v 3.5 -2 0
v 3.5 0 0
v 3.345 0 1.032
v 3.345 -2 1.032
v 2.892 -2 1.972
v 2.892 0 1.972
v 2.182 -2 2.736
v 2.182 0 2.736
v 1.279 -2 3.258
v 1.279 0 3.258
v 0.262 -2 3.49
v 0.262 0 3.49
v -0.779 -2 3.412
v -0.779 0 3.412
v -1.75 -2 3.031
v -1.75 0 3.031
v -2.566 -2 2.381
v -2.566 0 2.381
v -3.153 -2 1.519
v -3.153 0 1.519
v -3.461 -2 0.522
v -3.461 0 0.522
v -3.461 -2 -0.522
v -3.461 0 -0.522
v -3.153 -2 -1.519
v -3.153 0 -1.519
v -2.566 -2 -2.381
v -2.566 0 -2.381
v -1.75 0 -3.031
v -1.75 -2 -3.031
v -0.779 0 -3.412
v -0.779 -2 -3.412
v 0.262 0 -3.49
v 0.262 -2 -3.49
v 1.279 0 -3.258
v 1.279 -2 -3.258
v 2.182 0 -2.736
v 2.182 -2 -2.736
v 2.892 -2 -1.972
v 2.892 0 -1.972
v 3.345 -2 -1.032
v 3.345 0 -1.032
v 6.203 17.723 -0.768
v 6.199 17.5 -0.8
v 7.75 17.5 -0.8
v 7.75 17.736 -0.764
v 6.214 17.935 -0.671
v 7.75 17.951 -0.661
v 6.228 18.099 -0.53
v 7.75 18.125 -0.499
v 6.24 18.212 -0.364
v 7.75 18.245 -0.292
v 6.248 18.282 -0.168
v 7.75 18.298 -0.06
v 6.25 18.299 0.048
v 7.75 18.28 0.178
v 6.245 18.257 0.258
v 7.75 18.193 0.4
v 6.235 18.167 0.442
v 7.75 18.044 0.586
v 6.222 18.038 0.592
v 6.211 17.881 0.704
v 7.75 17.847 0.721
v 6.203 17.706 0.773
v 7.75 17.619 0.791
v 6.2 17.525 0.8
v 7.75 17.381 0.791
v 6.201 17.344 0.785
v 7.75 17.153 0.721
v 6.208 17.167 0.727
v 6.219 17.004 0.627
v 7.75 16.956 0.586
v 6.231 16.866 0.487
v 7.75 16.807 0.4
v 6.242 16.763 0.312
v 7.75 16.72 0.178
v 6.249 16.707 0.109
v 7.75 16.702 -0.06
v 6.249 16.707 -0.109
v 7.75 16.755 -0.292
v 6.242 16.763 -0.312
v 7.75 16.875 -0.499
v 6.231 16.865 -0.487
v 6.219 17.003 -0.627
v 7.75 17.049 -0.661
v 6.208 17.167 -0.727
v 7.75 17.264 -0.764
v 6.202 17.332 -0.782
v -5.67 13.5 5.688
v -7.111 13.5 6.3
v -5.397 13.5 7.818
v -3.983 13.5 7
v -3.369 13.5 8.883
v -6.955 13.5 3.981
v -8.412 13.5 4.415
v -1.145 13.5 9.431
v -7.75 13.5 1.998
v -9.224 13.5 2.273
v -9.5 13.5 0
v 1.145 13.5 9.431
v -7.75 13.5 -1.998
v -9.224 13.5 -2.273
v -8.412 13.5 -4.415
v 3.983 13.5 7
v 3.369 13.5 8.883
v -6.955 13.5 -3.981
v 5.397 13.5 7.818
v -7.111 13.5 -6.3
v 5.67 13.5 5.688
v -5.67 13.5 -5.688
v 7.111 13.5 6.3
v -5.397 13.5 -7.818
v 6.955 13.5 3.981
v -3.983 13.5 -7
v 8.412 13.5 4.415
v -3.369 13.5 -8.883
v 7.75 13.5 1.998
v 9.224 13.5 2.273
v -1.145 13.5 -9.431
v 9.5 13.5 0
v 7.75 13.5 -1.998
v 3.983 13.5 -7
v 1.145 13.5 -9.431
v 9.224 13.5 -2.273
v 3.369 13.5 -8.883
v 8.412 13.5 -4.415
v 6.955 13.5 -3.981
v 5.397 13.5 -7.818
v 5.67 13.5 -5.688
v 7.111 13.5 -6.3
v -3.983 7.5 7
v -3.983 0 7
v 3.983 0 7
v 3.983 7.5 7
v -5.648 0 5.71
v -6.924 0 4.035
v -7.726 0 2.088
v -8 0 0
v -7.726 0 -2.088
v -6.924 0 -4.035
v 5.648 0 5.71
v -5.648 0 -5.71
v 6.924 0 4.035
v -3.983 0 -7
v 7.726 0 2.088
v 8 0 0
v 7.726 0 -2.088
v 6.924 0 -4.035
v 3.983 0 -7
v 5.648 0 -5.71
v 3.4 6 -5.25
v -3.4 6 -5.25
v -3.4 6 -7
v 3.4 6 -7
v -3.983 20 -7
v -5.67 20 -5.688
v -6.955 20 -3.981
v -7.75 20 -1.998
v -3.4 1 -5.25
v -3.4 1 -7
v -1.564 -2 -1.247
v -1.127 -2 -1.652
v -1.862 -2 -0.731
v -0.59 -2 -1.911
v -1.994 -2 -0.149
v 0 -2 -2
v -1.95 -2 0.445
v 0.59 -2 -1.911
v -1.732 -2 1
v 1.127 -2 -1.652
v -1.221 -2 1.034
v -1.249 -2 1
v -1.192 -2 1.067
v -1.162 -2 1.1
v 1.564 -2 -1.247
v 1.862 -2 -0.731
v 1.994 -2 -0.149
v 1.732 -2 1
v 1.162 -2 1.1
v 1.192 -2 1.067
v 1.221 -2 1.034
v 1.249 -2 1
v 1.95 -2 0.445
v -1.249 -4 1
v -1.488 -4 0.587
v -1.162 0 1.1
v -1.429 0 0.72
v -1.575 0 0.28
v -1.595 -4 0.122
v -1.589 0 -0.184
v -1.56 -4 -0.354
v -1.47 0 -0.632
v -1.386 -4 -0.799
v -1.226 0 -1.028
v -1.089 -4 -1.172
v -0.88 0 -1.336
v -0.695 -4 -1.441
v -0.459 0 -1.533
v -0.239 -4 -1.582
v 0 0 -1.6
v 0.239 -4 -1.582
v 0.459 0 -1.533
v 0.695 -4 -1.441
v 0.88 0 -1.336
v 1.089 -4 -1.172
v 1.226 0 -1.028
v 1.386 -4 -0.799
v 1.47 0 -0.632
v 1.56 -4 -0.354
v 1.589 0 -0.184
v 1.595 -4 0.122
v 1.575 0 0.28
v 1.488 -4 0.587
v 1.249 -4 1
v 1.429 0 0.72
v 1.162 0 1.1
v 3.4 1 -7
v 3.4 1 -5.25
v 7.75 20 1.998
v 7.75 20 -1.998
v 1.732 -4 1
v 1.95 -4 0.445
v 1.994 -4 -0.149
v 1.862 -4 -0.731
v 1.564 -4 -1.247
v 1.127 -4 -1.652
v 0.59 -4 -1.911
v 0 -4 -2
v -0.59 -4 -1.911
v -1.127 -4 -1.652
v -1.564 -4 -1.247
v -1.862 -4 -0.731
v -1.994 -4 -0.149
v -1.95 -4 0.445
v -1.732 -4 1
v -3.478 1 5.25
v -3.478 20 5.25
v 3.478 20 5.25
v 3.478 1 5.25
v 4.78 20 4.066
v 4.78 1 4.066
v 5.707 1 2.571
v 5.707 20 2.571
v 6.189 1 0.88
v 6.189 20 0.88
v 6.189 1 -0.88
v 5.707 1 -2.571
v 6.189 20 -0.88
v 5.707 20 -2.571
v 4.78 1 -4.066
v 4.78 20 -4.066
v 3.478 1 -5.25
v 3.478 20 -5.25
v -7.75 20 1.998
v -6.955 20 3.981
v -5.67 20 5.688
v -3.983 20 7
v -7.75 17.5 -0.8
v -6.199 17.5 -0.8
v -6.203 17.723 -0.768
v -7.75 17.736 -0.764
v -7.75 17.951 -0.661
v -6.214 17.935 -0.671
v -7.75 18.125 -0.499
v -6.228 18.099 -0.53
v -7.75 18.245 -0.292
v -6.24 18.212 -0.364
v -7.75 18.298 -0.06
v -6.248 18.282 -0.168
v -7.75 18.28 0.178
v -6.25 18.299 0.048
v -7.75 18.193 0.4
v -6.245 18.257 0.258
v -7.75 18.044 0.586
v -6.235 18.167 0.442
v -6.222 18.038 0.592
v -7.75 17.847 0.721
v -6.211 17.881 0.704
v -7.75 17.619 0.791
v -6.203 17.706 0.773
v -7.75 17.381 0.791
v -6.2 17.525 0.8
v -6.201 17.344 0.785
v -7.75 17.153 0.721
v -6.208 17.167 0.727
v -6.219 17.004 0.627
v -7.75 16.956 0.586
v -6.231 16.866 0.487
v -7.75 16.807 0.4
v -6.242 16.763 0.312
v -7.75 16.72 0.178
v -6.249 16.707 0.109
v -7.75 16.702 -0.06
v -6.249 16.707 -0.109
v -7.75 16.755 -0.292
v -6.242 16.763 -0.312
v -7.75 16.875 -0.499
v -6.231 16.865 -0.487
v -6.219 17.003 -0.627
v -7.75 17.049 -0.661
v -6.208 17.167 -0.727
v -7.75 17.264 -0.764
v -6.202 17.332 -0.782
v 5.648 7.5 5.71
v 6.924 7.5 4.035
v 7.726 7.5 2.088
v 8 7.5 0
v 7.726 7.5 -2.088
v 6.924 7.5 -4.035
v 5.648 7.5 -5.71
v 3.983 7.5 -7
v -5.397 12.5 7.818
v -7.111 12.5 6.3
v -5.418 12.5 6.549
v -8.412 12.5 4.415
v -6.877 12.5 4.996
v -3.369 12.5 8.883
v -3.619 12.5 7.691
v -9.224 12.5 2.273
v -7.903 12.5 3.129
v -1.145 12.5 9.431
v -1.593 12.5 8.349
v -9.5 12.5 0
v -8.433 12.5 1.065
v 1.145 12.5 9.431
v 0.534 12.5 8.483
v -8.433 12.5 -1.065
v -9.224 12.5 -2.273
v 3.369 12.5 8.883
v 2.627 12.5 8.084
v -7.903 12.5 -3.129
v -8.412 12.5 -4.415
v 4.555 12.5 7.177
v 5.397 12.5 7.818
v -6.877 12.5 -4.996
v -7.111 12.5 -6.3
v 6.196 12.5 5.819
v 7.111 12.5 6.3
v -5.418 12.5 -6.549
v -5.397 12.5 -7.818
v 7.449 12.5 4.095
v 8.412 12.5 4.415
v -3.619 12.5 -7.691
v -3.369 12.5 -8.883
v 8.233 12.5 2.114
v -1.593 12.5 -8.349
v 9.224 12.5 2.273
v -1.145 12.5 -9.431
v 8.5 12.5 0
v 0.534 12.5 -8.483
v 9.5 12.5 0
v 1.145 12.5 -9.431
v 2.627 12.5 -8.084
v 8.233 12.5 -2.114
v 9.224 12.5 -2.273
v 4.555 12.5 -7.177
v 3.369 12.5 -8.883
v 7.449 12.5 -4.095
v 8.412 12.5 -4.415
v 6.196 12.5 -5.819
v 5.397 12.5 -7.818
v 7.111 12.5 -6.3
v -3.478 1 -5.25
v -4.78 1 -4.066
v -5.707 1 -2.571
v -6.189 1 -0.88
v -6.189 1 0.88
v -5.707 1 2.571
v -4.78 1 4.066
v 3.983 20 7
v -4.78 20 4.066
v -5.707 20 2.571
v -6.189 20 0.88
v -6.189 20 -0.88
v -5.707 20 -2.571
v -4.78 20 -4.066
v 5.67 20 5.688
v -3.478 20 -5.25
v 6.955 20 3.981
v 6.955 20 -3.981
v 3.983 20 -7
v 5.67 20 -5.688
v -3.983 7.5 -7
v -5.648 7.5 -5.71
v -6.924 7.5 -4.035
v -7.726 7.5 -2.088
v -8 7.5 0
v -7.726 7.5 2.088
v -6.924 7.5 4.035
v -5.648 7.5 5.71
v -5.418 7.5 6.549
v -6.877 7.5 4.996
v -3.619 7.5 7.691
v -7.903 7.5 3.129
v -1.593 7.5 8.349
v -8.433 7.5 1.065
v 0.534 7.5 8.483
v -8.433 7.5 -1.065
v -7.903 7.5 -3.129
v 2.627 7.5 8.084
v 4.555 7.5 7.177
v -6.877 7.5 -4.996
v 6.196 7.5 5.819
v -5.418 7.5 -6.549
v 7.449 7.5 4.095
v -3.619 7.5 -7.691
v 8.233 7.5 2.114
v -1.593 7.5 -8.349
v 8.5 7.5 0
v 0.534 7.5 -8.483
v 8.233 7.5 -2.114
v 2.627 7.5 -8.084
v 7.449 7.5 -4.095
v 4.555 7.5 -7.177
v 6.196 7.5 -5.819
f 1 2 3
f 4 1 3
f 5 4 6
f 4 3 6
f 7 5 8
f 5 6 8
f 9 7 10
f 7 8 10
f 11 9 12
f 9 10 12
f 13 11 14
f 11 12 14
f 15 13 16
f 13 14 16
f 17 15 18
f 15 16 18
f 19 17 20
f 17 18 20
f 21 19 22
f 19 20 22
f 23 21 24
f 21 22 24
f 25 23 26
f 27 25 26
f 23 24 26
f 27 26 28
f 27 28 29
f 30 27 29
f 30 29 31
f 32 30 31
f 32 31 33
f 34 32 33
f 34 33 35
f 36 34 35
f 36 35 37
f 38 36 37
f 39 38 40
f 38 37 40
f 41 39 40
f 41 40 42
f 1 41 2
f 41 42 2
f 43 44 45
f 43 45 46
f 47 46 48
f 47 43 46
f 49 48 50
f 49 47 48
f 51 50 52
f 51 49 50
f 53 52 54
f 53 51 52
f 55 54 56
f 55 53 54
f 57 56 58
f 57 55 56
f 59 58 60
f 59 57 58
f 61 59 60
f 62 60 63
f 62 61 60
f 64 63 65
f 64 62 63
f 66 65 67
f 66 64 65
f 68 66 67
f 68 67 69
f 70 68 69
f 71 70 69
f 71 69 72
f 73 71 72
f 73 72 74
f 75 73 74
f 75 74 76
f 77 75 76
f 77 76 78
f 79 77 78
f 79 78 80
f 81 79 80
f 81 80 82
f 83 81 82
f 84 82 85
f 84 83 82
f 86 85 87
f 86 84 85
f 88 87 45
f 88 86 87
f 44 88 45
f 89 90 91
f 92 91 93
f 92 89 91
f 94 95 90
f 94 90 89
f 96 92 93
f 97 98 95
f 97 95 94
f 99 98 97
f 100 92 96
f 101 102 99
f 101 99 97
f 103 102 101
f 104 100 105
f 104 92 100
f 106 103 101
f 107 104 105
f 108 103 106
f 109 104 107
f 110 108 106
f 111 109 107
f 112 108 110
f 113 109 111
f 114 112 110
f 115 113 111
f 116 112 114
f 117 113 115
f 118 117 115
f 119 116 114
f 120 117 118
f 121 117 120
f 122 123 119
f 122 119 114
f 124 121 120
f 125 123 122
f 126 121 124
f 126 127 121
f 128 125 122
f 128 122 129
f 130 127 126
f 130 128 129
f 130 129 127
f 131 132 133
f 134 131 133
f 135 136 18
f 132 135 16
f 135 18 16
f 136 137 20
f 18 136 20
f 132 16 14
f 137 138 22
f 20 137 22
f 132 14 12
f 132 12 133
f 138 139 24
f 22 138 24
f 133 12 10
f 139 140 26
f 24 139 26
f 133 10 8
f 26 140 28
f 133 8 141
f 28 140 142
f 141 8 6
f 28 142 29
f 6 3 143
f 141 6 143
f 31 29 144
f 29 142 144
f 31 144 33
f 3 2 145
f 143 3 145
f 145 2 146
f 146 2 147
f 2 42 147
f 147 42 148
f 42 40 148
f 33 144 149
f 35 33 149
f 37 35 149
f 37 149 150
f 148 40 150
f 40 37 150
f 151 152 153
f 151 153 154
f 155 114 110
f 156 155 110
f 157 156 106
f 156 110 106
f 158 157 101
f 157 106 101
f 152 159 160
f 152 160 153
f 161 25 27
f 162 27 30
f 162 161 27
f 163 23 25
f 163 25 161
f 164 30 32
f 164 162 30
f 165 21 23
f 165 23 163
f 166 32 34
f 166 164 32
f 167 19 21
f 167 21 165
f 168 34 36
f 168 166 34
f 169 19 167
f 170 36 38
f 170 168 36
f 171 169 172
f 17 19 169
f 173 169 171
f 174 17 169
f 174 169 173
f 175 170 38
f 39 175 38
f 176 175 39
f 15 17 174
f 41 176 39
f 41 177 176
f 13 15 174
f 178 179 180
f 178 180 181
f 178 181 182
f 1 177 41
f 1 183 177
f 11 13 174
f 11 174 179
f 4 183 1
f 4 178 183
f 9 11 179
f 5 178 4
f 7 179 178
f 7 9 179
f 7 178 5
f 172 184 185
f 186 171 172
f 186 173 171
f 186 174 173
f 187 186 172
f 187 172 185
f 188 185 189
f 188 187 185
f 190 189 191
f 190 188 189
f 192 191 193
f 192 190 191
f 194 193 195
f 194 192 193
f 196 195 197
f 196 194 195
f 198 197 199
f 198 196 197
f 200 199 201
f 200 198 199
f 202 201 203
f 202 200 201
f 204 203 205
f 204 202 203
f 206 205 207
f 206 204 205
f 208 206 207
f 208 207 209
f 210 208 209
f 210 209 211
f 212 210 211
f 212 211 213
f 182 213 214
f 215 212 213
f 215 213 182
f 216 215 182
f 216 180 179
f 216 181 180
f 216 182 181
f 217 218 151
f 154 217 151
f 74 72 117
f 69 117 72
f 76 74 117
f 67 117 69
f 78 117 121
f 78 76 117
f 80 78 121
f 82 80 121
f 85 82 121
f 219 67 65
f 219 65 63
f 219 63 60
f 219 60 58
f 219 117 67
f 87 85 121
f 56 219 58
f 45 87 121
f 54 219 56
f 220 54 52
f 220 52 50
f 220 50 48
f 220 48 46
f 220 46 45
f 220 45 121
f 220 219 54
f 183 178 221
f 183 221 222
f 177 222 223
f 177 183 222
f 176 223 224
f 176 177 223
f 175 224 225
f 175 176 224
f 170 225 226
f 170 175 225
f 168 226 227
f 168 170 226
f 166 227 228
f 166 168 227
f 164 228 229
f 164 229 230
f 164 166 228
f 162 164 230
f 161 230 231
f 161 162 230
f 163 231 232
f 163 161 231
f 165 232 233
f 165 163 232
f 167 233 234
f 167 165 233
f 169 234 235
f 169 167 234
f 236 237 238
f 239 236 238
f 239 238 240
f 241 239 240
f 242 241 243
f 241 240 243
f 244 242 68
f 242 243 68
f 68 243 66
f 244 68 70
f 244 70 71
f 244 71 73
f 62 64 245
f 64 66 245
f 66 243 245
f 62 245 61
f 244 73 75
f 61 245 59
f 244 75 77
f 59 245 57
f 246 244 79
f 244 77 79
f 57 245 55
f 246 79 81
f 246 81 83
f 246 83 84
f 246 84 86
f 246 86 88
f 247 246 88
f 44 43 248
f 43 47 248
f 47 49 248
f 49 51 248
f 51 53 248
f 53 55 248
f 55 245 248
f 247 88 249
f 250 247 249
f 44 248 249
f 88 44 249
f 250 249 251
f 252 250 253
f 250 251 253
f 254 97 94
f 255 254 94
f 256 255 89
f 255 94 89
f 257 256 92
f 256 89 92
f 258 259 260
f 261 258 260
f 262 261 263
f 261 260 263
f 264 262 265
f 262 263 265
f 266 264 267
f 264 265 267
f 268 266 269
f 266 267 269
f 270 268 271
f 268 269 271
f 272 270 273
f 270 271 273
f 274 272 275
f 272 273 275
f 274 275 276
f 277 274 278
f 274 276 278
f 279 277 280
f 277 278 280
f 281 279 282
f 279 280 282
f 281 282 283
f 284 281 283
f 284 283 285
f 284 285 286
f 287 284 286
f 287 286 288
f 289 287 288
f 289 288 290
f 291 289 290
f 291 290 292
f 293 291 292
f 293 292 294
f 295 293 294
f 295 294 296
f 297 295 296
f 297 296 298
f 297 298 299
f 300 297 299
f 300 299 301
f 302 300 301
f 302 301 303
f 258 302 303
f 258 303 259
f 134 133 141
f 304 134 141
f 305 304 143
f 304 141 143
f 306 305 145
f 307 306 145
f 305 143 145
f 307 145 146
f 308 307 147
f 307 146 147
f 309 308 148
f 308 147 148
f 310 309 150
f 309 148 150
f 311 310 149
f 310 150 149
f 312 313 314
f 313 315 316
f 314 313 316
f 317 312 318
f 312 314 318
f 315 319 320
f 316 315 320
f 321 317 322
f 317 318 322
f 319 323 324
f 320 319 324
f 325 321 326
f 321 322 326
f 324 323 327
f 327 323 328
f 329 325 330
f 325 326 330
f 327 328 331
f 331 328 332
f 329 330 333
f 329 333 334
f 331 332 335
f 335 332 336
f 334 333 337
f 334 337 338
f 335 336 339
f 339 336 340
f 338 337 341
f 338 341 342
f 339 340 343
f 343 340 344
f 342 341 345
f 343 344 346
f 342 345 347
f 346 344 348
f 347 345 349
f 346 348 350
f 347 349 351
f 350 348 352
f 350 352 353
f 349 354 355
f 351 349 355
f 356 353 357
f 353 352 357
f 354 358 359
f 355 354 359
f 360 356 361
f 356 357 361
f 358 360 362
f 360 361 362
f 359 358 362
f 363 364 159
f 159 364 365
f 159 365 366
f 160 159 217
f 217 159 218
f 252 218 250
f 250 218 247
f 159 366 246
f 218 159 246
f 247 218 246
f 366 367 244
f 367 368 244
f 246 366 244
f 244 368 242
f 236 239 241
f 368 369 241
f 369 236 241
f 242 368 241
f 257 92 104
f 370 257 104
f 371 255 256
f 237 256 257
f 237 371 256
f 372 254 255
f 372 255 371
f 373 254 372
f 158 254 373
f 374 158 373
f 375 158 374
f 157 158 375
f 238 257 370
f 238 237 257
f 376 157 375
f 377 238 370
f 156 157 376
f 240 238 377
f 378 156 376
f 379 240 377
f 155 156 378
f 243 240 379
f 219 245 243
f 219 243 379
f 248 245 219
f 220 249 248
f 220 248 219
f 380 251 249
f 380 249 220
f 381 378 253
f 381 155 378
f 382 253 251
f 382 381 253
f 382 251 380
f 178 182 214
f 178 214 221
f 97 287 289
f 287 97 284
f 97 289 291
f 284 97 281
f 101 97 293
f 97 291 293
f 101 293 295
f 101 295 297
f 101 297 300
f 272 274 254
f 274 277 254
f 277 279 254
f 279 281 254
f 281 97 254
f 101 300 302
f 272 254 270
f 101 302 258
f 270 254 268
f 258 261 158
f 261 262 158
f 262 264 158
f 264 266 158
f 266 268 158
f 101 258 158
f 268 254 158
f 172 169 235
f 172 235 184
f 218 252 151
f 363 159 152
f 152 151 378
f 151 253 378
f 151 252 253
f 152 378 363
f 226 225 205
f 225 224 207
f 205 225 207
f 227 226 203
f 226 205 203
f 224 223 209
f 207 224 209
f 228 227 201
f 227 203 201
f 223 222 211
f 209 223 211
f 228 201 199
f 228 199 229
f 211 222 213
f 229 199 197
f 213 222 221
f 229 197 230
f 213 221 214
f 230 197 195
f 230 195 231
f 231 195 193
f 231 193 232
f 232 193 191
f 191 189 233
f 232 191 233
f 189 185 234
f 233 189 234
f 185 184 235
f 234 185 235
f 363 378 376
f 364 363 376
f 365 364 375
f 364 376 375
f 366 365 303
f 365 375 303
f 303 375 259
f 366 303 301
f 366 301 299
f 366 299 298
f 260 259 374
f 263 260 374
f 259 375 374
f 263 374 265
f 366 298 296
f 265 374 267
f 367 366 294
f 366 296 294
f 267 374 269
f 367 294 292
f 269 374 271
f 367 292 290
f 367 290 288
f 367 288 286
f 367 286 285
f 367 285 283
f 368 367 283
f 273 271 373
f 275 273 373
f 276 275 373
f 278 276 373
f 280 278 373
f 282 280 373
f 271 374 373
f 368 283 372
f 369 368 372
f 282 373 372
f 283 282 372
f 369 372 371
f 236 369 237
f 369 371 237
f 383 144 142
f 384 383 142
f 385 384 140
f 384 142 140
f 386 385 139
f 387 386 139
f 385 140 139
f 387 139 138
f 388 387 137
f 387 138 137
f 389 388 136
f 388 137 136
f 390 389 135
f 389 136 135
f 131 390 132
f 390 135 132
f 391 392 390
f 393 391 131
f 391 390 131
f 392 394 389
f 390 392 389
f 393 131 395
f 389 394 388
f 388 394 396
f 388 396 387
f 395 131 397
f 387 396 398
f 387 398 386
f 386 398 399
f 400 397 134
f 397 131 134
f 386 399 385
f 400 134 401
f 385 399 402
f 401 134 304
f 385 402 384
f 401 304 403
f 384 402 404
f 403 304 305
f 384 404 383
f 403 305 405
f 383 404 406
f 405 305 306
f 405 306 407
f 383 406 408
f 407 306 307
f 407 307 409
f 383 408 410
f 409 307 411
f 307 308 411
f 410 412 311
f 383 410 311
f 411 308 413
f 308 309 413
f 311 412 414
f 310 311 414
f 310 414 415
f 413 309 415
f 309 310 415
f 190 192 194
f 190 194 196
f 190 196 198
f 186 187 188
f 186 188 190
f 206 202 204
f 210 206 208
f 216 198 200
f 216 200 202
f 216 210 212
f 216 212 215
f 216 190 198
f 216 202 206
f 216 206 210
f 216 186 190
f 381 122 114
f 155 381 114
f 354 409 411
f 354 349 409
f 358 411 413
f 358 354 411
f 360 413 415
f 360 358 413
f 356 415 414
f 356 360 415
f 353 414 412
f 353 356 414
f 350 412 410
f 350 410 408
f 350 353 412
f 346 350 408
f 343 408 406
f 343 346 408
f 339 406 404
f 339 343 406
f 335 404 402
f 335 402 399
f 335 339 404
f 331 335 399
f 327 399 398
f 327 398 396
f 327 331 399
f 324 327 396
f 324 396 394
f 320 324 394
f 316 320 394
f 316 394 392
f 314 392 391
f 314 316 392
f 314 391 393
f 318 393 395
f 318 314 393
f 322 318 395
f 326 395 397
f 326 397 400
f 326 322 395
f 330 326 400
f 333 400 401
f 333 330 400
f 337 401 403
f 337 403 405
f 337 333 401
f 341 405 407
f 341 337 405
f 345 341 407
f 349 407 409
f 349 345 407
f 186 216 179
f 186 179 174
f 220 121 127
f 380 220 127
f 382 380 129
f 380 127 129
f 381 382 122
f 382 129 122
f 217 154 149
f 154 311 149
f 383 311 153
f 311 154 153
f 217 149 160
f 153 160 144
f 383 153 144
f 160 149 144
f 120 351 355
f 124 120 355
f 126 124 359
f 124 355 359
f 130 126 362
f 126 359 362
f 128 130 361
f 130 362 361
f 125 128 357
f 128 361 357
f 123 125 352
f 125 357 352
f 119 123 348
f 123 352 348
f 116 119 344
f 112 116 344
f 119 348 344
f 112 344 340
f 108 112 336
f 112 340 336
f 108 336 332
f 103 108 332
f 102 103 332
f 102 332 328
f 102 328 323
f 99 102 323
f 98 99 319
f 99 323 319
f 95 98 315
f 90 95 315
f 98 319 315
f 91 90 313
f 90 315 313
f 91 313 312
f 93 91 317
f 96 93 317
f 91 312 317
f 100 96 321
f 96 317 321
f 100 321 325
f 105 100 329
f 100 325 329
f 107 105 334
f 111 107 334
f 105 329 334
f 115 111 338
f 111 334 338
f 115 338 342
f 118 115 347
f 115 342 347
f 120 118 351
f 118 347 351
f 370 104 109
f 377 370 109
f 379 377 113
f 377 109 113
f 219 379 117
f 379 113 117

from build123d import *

# Parameters (mm, degrees)
BOSS_EXTRUDE3_DEPTH     = 20
BOSS_EXTRUDE5_DEPTH     = 1
SKETCH18_W              = 6.8
SKETCH18_H              = 5
CUT_EXTRUDE3_DEPTH      = 3
SKETCH25_R              = 8.5
BOSS_EXTRUDE6_DEPTH     = 2.5
SKETCH26_R              = 9.5
BOSS_EXTRUDE7_DEPTH     = 1
BOSS_EXTRUDE11_DEPTH    = 4
CUT_EXTRUDE7_DEPTH      = 4
SKETCH35_R              = 3.5
BOSS_EXTRUDE12_DEPTH    = 2
SKETCH36_R              = 0.8
CUT_EXTRUDE8_DEPTH      = 10.5
CUT_EXTRUDE8_DEPTH_BACK = 10.5
CUT_EXTRUDE9_DEPTH      = 6.5
CUT_EXTRUDE10_DEPTH     = 5
CUT_EXTRUDE11_DEPTH     = 19


with BuildPart() as part:
    # Sketch5 → Boss-Extrude3 (new body)
    with BuildSketch(Plane(origin=(0, 0, 0), x_dir=(1, 0, 0), z_dir=(0, 1, 0))):
        with BuildLine():
            Line((-3.983111349, -7), (3.983111349, -7))
            ThreePointArc((3.983111349, -7), (8, 0), (3.983111349, 7))
            Line((3.983111349, 7), (-3.983111349, 7))
            ThreePointArc((-3.983111349, 7), (-8, 0), (-3.983111349, -7))
        make_face()
        with BuildLine():
            Line((-3.4, -5), (3.4, -5))
            ThreePointArc((3.4, -5), (6, 0), (3.4, 5))
            Line((3.4, 5), (-3.4, 5))
            ThreePointArc((-3.4, 5), (-6, 0), (-3.4, -5))
        make_face(mode=Mode.SUBTRACT)
    extrude(amount=BOSS_EXTRUDE3_DEPTH)

    # Sketch7 → Boss-Extrude5 (add)
    with BuildSketch(Plane(origin=(0, 0, 0), x_dir=(1, 0, 0), z_dir=(0, 1, 0))):
        with BuildLine():
            Line((3.983111349, 7), (-3.983111349, 7))
            ThreePointArc((-3.983111349, 7), (-8, 0), (-3.983111349, -7))
            Line((-3.983111349, -7), (3.983111349, -7))
            ThreePointArc((3.983111349, -7), (8, 0), (3.983111349, 7))
        make_face()
    extrude(amount=BOSS_EXTRUDE5_DEPTH)

    # Sketch18 → Cut-Extrude3 (cut, through all)
    with BuildSketch(Plane.XY.offset(-5)):
        with Locations((0, 3.5)):
            Rectangle(SKETCH18_W, SKETCH18_H)
    extrude(amount=-CUT_EXTRUDE3_DEPTH, mode=Mode.SUBTRACT)

    # Sketch25 → Boss-Extrude6 (add, symmetric)
    with BuildSketch(Plane(origin=(0, 10, 0), x_dir=(1, 0, 0), z_dir=(0, 1, 0))):
        Circle(SKETCH25_R)
        with BuildLine():
            Line((3.983111349, 7), (-3.983111349, 7))
            ThreePointArc((-3.983111349, 7), (-8, 0), (-3.983111349, -7))
            Line((-3.983111349, -7), (3.983111349, -7))
            ThreePointArc((3.983111349, -7), (8, 0), (3.983111349, 7))
        make_face(mode=Mode.SUBTRACT)
    extrude(amount=BOSS_EXTRUDE6_DEPTH, both=True)

    # Sketch26 → Boss-Extrude7 (add)
    with BuildSketch(Plane(origin=(0, 12.5, 0), x_dir=(1, 0, 0), z_dir=(0, 1, 0))):
        Circle(SKETCH26_R)
        with BuildLine():
            Line((3.983111349, 7), (-3.983111349, 7))
            ThreePointArc((-3.983111349, 7), (-8, 0), (-3.983111349, -7))
            Line((-3.983111349, -7), (3.983111349, -7))
            ThreePointArc((3.983111349, -7), (8, 0), (3.983111349, 7))
        make_face(mode=Mode.SUBTRACT)
    extrude(amount=BOSS_EXTRUDE7_DEPTH)

    # Sketch32 → Boss-Extrude11 (add)
    with BuildSketch(Plane.XZ):
        with BuildLine():
            Line((-1.732050808, 1), (1.732050808, 1))
            ThreePointArc((1.732050808, 1), (0, -2), (-1.732050808, 1))
        make_face()
    extrude(amount=BOSS_EXTRUDE11_DEPTH)

    # Sketch34 → Cut-Extrude7 (cut)
    with BuildSketch(Plane.XZ.offset(4)):
        with BuildLine():
            Line((-1.118033989, 1), (1.118033989, 1))
            ThreePointArc((1.118033989, 1), (0, -1.5), (-1.118033989, 1))
        make_face()
    extrude(amount=-CUT_EXTRUDE7_DEPTH, mode=Mode.SUBTRACT)

    # Sketch35 → Boss-Extrude12 (add)
    with BuildSketch(Plane.XZ):
        Circle(SKETCH35_R)
        with BuildLine():
            Line((-1.118033989, 1), (1.118033989, 1))
            ThreePointArc((1.118033989, 1), (0, -1.5), (-1.118033989, 1))
        make_face(mode=Mode.SUBTRACT)
    extrude(amount=BOSS_EXTRUDE12_DEPTH)

    # Sketch36 → Cut-Extrude8 (cut, two sides)
    with BuildSketch(Plane(origin=(0, 0, 0), x_dir=(0, 0, -1), z_dir=(1, 0, 0))) as cut_extrude8_sk:
        with Locations((0, 17.5)):
            Circle(SKETCH36_R)
    extrude(amount=CUT_EXTRUDE8_DEPTH, mode=Mode.SUBTRACT)
    extrude(cut_extrude8_sk.sketch, amount=-CUT_EXTRUDE8_DEPTH_BACK, mode=Mode.SUBTRACT)

    # Sketch37 → Cut-Extrude9 (cut)
    with BuildSketch(Plane(origin=(0, 20, 0), x_dir=(1, 0, 0), z_dir=(0, 1, 0))):
        with BuildLine():
            Line((7.75, -1.997835367), (7.75, 1.997835367))
            ThreePointArc((7.75, 1.997835367), (8, 0), (7.75, -1.997835367))
        make_face()
        with BuildLine():
            Line((-7.75, -1.997835367), (-7.75, 1.997835367))
            ThreePointArc((-7.75, 1.997835367), (-8, 0), (-7.75, -1.997835367))
        make_face()
    extrude(amount=-CUT_EXTRUDE9_DEPTH, mode=Mode.SUBTRACT)

    # Sketch38 → Cut-Extrude10 (cut, through all)
    with BuildSketch(Plane.XZ):
        with BuildLine():
            Line((1.161895004, 1.1), (-1.161895004, 1.1))
            ThreePointArc((-1.161895004, 1.1), (0, -1.6), (1.161895004, 1.1))
        make_face()
    extrude(amount=CUT_EXTRUDE10_DEPTH, mode=Mode.SUBTRACT)

    # Sketch39 → Cut-Extrude11 (cut)
    with BuildSketch(Plane(origin=(0, 20, 0), x_dir=(1, 0, 0), z_dir=(0, 1, 0))):
        with BuildLine():
            Line((3.478078388, 5.25), (-3.478078388, 5.25))
            ThreePointArc((-3.478078388, 5.25), (-6.25, 0), (-3.478078388, -5.25))
            Line((-3.478078388, -5.25), (3.478078388, -5.25))
            ThreePointArc((3.478078388, -5.25), (6.25, 0), (3.478078388, 5.25))
        make_face()
        with BuildLine():
            Line((-3.4, 5), (3.4, 5))
            ThreePointArc((3.4, 5), (6, 0), (3.4, -5))
            Line((3.4, -5), (-3.4, -5))
            ThreePointArc((-3.4, -5), (-6, 0), (-3.4, 5))
        make_face(mode=Mode.SUBTRACT)
    extrude(amount=-CUT_EXTRUDE11_DEPTH, mode=Mode.SUBTRACT)


solid = part.part
